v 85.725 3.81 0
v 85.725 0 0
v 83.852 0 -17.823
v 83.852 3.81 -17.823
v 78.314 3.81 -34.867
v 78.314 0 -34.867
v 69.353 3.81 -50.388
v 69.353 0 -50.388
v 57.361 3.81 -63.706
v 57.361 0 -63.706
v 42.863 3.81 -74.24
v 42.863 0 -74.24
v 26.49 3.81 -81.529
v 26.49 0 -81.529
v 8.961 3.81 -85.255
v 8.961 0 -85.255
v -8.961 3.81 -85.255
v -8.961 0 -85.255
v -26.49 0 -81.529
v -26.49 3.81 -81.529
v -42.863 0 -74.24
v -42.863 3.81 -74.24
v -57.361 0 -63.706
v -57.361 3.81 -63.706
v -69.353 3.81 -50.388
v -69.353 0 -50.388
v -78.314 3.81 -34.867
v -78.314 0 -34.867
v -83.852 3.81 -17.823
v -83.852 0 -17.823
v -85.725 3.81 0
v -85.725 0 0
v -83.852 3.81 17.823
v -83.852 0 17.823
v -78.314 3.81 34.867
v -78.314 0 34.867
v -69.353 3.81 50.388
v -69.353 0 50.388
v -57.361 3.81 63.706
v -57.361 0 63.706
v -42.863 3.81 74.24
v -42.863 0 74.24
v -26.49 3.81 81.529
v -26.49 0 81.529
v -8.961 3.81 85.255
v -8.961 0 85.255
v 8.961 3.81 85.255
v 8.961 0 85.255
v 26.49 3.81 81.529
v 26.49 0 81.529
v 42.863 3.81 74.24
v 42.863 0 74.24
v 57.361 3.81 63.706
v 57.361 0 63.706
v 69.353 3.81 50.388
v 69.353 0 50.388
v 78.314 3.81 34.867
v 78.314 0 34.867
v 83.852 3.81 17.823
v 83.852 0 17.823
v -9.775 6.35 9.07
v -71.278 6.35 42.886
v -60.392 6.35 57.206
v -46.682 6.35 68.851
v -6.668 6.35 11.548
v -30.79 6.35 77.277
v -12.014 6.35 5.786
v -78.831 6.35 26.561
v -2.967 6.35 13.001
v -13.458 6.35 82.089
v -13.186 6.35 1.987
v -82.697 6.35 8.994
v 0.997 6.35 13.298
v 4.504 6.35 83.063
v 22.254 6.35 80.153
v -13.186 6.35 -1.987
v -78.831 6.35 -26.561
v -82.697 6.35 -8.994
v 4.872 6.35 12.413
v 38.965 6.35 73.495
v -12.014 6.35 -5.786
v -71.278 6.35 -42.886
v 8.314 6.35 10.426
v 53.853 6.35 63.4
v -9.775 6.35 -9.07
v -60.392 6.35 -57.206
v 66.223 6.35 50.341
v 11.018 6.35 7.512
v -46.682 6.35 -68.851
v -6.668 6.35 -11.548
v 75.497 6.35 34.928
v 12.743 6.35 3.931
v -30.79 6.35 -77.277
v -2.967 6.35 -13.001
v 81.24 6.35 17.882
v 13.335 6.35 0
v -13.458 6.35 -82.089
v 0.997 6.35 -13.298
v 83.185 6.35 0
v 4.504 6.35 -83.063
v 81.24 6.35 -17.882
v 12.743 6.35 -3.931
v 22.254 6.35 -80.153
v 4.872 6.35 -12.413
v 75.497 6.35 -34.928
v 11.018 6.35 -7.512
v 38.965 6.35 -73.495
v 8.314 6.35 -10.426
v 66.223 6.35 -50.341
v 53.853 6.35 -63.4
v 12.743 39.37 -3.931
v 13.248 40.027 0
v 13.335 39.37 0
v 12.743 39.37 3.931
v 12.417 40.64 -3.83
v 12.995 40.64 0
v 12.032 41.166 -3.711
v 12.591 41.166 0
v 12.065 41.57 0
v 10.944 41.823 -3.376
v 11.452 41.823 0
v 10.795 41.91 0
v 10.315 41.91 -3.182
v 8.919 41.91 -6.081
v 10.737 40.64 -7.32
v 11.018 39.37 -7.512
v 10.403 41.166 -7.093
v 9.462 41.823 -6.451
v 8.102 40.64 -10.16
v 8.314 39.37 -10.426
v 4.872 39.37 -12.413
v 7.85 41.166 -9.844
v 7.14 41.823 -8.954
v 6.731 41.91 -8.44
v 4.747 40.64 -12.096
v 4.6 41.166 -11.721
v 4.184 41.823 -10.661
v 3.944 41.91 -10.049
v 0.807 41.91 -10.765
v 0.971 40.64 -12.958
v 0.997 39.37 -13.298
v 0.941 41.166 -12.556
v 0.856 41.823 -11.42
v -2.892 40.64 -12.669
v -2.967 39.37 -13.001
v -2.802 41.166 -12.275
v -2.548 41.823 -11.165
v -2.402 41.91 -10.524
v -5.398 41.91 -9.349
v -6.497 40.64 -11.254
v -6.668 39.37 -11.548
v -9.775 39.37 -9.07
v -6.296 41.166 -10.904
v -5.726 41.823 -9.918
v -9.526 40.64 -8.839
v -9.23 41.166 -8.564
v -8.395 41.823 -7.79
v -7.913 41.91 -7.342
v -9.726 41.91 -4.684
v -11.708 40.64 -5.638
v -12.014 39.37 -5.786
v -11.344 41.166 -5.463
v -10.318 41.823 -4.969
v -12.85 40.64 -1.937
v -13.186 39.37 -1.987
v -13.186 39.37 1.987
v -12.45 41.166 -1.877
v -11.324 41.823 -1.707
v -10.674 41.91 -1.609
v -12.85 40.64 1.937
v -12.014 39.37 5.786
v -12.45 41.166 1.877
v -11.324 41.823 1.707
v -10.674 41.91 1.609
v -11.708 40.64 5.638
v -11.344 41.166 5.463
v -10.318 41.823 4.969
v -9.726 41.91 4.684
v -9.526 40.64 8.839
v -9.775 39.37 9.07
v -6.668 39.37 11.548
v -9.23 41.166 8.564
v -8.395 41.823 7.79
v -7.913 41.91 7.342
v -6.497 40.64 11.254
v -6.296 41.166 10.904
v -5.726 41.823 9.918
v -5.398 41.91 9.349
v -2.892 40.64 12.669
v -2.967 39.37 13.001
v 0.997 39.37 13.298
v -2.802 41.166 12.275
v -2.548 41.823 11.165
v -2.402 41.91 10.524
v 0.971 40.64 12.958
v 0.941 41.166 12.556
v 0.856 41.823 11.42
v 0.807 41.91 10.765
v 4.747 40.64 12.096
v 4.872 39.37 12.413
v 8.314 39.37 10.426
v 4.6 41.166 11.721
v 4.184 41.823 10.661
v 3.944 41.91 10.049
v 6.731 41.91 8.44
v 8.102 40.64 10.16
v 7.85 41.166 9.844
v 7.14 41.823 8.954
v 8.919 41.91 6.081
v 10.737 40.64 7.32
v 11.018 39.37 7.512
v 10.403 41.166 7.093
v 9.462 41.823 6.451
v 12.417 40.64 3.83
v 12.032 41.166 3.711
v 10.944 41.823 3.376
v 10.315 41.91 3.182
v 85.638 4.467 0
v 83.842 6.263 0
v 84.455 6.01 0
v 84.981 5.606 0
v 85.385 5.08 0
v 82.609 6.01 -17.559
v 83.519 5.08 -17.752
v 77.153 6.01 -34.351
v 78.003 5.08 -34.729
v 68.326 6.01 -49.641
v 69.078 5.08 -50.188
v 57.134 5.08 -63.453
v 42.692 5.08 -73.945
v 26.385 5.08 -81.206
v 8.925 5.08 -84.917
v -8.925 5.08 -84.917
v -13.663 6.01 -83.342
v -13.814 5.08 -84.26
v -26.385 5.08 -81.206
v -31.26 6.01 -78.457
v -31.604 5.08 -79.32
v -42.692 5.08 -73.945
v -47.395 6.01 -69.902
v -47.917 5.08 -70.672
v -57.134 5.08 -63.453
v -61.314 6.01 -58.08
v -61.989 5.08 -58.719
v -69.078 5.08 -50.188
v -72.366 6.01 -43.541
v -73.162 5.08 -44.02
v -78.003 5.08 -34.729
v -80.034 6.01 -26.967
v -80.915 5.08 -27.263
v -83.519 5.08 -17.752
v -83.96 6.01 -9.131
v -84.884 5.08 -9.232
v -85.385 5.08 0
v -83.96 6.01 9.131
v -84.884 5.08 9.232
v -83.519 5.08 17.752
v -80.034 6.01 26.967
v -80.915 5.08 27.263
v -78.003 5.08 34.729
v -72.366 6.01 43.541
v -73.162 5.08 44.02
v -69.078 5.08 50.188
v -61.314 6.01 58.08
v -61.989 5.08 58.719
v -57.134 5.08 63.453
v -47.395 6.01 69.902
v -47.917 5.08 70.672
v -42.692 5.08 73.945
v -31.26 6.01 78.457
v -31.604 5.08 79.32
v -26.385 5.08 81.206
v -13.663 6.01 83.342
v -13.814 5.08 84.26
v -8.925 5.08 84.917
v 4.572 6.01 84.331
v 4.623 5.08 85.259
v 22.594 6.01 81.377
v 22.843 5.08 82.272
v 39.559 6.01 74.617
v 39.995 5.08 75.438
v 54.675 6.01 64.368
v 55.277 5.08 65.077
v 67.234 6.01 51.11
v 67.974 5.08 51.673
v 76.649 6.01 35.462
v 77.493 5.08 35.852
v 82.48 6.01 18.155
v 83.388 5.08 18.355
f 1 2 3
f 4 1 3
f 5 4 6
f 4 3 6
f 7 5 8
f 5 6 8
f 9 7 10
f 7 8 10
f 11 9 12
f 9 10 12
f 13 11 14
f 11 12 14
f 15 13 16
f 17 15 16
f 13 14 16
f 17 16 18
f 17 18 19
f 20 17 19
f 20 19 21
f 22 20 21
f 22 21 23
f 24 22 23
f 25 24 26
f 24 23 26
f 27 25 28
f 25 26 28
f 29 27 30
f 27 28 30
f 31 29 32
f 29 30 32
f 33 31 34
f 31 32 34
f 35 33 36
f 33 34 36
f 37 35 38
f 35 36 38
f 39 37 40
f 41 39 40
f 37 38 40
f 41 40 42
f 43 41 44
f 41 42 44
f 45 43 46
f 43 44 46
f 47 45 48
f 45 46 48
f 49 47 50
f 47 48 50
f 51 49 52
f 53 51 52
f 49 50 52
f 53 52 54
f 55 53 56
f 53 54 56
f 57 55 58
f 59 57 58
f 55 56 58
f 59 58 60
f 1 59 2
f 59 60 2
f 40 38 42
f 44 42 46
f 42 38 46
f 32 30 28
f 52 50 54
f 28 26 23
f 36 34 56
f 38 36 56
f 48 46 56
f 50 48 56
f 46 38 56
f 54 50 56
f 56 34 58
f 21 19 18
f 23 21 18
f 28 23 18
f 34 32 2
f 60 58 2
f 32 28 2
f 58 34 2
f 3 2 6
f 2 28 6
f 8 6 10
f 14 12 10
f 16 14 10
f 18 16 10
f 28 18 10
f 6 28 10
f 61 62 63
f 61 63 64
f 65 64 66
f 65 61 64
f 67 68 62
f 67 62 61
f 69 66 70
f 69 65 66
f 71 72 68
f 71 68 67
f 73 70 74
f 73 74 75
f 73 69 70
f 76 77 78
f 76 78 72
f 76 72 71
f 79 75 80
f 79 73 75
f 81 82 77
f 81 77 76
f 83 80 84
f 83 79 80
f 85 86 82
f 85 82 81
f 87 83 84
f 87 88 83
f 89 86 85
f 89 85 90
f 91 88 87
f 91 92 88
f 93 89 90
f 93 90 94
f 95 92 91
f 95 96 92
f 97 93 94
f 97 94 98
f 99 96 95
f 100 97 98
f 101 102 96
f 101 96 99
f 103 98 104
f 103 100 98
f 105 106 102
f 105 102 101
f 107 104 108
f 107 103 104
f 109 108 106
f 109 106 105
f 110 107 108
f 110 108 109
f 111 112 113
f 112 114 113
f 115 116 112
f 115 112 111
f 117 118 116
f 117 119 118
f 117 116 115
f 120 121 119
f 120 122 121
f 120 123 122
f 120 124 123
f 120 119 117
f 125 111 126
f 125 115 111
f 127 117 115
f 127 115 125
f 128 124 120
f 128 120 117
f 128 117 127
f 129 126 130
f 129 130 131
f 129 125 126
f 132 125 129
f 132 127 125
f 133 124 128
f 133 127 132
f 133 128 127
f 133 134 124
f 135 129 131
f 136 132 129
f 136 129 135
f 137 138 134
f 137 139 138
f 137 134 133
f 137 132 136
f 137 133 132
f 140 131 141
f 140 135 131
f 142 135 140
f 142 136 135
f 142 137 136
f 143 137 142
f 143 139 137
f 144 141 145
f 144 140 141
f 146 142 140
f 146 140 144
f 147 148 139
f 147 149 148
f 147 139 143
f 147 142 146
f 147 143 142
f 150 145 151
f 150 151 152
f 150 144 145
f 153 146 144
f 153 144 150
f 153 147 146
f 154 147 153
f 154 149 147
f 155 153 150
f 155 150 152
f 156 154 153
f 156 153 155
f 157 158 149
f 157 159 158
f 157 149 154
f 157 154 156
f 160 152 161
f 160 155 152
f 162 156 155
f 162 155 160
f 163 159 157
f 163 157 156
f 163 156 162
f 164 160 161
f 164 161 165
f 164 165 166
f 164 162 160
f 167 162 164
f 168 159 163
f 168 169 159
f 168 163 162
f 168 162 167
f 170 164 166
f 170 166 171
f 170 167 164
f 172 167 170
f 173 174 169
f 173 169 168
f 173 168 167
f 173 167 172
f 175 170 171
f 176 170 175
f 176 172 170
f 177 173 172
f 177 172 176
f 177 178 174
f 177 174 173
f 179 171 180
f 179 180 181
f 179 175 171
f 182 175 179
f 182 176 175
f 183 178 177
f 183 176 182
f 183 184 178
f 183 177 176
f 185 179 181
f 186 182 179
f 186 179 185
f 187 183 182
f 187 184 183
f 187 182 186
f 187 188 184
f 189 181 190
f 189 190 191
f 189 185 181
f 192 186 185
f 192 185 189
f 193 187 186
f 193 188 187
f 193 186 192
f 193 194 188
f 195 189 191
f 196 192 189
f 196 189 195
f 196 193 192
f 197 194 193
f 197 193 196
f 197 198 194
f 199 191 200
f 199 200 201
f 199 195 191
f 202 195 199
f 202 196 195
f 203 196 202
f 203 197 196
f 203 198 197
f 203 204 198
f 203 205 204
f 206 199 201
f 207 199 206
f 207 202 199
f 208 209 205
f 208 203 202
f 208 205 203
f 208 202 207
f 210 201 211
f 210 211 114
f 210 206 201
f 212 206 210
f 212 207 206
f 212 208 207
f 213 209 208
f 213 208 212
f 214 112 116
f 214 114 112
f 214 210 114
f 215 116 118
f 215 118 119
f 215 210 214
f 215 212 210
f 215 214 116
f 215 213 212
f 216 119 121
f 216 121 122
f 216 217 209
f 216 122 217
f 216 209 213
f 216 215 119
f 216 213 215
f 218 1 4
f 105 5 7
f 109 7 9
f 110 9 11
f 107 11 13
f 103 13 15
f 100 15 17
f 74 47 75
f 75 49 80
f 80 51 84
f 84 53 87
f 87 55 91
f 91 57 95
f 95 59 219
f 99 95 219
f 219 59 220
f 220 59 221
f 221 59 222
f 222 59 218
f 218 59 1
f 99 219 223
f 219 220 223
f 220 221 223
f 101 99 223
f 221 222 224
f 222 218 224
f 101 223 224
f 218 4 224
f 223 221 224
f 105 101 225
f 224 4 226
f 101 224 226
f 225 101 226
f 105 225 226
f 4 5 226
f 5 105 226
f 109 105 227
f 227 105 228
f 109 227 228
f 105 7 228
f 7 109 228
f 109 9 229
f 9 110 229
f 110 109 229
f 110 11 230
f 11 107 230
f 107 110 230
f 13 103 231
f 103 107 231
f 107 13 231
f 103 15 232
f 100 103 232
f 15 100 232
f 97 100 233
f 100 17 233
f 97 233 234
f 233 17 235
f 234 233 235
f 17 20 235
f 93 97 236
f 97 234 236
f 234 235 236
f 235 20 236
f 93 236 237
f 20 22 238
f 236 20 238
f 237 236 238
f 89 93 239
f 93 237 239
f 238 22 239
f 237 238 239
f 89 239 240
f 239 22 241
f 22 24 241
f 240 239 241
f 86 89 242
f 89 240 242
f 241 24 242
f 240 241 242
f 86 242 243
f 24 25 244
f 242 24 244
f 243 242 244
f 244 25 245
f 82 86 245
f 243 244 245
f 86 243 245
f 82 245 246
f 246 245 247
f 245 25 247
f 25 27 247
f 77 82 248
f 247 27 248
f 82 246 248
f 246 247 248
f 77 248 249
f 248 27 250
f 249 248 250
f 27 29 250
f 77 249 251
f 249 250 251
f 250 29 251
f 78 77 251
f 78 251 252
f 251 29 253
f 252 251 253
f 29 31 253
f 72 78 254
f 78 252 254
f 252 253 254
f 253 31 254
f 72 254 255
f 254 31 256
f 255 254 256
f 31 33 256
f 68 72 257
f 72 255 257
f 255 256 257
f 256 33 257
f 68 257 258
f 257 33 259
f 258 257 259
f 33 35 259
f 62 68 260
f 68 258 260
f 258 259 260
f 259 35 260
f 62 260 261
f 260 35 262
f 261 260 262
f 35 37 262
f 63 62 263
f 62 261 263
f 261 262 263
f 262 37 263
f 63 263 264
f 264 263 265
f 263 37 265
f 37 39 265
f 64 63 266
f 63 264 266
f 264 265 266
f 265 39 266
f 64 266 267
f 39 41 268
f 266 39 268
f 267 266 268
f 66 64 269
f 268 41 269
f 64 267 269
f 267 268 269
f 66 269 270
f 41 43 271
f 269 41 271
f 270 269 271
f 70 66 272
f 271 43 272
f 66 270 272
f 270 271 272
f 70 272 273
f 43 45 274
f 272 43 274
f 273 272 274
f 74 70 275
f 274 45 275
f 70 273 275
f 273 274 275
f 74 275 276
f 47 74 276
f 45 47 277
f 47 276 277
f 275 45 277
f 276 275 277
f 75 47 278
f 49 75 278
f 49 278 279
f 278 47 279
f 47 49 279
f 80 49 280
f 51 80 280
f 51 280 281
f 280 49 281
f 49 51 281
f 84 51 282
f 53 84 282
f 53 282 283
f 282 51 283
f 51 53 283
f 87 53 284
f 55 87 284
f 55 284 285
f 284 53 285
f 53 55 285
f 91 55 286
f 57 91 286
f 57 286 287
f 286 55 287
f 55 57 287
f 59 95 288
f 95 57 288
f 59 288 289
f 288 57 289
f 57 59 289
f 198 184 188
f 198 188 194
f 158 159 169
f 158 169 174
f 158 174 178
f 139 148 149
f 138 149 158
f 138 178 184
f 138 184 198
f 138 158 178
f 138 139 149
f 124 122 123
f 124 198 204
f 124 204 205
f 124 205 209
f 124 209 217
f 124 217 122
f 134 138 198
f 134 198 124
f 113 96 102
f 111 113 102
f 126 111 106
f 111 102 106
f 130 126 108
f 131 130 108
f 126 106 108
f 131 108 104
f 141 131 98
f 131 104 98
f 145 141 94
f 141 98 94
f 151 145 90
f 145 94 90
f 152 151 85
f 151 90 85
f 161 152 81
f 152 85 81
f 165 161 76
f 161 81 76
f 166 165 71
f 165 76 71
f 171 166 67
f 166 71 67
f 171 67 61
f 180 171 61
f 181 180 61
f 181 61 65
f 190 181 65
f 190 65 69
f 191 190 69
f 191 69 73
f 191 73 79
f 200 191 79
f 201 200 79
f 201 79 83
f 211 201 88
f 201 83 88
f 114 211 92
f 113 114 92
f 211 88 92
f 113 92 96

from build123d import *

# Parameters (mm, degrees)
SKETCH1_R           = 85.725
BOSS_EXTRUDE1_DEPTH = 6.35
SKETCH2_R           = 13.335
BOSS_EXTRUDE2_DEPTH = 35.56
FILLET1_R           = 2.54
FILLET2_R           = 2.54


with BuildPart() as part:
    # Sketch1 → Boss-Extrude1 (new body)
    with BuildSketch(Plane(origin=(0, 0, 0), x_dir=(1, 0, 0), z_dir=(0, 1, 0))):
        Circle(SKETCH1_R)
    extrude(amount=BOSS_EXTRUDE1_DEPTH)

    # Sketch2 → Boss-Extrude2 (add)
    with BuildSketch(Plane(origin=(0, 6.35, 0), x_dir=(1, 0, 0), z_dir=(0, 1, 0))):
        Circle(SKETCH2_R)
    extrude(amount=BOSS_EXTRUDE2_DEPTH)

    # Fillet1
    fillet1_edges = [part.edges().sort_by_distance(p)[0] for p in [
        (-13.335, 41.91, 0),
    ]]
    fillet(fillet1_edges, radius=FILLET1_R)

    # Fillet2
    fillet2_edges = [part.edges().sort_by_distance(p)[0] for p in [
        (-85.725, 6.35, 0),
    ]]
    fillet(fillet2_edges, radius=FILLET2_R)


solid = part.part
